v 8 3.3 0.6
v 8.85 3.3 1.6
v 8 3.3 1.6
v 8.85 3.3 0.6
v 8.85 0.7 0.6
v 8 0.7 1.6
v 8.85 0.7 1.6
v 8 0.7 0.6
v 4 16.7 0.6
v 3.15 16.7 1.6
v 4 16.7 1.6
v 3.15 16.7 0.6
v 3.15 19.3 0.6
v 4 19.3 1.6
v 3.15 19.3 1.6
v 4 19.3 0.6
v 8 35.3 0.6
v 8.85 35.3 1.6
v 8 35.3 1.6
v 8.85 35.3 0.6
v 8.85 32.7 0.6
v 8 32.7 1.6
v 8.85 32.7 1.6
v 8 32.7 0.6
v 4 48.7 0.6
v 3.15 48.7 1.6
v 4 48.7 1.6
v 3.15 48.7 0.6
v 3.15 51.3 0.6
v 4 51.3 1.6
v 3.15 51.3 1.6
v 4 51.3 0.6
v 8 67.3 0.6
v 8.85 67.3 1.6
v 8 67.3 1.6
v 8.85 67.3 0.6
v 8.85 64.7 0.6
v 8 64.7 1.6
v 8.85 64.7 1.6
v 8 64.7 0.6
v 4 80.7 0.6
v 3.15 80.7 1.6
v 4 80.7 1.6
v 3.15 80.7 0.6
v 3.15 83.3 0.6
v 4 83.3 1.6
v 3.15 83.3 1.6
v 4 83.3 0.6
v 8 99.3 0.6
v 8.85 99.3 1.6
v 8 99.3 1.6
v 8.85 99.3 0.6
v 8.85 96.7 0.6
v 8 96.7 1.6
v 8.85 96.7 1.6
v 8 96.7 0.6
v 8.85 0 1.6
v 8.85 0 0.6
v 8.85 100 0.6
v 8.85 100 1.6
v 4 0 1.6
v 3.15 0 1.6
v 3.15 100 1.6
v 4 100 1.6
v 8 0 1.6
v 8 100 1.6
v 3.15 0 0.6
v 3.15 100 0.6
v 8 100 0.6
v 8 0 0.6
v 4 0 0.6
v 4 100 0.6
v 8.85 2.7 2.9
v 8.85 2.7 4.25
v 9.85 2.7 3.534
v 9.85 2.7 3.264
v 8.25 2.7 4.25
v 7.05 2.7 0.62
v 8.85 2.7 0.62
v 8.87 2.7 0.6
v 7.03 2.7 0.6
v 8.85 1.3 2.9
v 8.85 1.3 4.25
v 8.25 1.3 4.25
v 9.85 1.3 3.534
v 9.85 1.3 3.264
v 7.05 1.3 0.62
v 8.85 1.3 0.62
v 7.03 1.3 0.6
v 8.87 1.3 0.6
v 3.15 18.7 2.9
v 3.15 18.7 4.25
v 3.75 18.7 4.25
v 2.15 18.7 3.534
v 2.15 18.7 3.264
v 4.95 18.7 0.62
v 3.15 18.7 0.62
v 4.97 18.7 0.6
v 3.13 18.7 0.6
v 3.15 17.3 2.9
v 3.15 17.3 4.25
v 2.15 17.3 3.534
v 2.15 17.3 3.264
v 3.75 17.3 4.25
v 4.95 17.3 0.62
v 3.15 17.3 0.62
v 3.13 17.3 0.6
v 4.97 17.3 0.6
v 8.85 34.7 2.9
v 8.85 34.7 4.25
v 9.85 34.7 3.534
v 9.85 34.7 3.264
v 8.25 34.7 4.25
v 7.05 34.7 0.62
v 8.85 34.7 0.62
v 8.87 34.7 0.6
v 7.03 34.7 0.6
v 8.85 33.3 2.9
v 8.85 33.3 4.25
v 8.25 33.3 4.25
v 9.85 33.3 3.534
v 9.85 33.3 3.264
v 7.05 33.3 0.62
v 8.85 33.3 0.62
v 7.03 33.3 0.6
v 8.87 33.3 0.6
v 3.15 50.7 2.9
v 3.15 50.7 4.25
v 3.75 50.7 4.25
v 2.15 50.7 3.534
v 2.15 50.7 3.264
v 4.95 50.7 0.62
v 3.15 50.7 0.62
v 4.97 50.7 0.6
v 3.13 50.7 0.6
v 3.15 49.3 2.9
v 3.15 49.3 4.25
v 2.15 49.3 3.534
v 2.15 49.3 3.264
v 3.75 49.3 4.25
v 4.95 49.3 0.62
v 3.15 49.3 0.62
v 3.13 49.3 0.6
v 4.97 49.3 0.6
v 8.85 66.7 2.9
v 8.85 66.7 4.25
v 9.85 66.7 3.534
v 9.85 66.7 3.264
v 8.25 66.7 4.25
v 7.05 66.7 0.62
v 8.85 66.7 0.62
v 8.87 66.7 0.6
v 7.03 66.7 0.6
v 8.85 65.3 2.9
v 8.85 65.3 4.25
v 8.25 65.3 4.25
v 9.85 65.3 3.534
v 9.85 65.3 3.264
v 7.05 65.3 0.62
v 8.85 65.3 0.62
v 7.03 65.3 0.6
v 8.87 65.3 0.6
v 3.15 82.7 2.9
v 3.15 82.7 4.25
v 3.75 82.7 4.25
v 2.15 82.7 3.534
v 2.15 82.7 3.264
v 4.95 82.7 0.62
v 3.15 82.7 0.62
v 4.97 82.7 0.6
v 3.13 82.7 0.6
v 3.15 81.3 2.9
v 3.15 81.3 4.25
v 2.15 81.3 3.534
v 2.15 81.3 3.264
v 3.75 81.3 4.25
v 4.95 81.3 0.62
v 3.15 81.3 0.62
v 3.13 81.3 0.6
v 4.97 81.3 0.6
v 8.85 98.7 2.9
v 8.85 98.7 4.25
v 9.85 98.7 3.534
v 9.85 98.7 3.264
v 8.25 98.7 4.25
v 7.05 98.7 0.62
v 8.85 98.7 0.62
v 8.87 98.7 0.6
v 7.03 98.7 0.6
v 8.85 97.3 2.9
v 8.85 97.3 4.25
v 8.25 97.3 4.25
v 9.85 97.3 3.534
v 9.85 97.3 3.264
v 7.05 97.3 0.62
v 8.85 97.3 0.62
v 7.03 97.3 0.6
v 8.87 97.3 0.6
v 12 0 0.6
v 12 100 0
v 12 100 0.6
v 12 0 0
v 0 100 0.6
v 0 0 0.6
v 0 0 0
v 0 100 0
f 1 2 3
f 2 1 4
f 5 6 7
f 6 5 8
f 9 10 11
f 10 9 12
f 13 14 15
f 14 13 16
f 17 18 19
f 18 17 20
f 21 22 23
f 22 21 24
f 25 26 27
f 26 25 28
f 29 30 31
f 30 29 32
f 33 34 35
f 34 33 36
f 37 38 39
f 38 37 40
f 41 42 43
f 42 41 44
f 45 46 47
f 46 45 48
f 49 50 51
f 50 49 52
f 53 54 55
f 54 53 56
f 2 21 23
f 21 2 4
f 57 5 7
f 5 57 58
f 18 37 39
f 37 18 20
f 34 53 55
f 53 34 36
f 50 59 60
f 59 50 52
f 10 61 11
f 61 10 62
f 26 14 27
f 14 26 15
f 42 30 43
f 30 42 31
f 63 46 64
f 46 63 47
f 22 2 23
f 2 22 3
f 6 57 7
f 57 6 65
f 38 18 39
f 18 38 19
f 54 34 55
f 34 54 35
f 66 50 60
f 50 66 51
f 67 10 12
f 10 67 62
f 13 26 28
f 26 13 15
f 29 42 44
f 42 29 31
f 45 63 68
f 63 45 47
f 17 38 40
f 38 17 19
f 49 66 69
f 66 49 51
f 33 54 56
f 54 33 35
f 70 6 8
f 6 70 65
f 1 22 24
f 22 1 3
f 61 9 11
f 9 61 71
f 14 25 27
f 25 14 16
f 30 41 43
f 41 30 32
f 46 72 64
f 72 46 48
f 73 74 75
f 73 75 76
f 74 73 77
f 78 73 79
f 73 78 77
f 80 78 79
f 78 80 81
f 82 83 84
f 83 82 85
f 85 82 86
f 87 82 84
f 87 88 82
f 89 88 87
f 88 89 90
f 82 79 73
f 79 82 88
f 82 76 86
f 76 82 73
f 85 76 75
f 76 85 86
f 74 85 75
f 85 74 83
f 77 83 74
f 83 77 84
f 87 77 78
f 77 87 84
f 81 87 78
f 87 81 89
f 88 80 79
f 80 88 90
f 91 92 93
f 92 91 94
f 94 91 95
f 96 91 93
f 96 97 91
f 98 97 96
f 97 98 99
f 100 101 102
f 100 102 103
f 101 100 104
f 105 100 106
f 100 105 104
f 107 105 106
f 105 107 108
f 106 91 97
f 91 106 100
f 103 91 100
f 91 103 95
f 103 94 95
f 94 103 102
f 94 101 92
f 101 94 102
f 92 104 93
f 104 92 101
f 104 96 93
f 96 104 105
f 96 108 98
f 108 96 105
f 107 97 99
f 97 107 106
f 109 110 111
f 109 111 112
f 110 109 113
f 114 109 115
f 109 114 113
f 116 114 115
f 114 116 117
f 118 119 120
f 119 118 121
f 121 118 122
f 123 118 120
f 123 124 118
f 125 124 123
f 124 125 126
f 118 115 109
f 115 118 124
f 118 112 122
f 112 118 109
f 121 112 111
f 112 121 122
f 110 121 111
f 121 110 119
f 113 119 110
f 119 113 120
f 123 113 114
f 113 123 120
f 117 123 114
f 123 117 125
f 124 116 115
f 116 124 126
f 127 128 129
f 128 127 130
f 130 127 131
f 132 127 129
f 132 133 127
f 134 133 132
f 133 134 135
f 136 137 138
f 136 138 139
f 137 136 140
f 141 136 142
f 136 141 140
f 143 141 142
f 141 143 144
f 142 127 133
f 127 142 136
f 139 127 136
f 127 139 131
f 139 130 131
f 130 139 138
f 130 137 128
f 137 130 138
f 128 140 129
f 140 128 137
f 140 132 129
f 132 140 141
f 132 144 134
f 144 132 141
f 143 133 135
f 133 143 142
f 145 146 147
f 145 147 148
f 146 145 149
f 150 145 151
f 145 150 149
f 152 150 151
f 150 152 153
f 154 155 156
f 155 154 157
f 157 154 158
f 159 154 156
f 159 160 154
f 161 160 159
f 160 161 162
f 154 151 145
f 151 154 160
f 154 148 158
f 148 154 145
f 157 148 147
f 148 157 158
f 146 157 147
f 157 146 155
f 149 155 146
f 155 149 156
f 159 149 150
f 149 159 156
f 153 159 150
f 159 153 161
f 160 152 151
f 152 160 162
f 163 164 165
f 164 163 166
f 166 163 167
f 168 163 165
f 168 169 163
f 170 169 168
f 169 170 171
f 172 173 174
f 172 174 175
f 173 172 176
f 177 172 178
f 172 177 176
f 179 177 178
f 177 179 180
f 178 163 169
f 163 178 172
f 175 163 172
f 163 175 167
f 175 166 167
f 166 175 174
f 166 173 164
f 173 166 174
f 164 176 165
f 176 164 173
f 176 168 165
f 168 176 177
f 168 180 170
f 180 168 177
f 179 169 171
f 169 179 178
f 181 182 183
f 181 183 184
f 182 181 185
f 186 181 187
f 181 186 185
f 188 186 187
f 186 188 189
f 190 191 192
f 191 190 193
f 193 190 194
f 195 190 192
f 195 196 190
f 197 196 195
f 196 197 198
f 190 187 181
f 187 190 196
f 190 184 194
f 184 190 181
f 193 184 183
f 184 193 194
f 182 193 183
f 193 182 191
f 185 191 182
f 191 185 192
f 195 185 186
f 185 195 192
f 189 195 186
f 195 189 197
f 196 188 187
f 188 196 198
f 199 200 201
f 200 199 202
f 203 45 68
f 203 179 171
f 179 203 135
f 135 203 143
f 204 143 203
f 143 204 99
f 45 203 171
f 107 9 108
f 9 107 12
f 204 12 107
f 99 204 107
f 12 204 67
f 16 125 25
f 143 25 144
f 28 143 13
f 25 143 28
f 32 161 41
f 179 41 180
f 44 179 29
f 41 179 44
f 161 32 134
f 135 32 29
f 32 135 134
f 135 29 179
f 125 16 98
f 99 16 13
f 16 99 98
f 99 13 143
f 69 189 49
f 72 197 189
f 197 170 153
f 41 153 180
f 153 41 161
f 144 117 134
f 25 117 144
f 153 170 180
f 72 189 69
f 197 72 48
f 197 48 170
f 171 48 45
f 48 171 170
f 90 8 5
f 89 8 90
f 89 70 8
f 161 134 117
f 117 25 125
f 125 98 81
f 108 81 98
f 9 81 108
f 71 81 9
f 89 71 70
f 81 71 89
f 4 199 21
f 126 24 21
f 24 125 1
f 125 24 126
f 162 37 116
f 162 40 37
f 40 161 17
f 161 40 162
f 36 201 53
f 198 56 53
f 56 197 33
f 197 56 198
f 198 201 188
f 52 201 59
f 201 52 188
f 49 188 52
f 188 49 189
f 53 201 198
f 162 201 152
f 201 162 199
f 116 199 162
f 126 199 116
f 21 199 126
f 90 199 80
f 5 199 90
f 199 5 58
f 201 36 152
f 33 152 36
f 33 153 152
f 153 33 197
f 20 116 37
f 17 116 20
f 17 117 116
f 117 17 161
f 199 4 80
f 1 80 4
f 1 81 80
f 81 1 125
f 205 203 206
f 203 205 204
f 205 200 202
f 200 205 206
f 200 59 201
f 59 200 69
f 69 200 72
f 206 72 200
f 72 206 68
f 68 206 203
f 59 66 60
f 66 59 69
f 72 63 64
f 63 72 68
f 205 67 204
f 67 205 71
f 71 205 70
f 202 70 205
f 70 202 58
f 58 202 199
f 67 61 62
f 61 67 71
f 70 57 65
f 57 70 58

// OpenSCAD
// user configuration

// should be equal to spacing of LEDs in your strip
snap_spacing=16.0;

// total length of the part
length=100;

// increase this if you want to go thicker but diffuser_block_depth is already at maximum value
top_thickness=0.6;

// bigger value -> less light gets through. should not exceed 4, otherwise won't fit in 2020 V slot with LED
diffuser_block_depth=1.0;

// set to 0 to solidify the middle between walls
canyon_width=4;

tolerance=0.3;

// should be at least 8
top_width=12.0;

// probably not interesting
hide_from_ui=sin(0);
tol=tolerance; // abbreviation
depth=4 - tol + hide_from_ui;
width=6 - tol + hide_from_ui;
snap_width=2.0 + hide_from_ui;
snap_slot_depth=2.75 + hide_from_ui;

/*
     |-| overhang_depth
y   __ ...y=h+overhang_h
|  |  \
|  |  | <- land_length
|  |  / <- return_angle
|  | |......................y=h
|  | |  <- thickness
|  | |
| _/ \_ <- bevel
+----|-----------> x
     *x=0

w: length in Z dimension
h: how thick is whatever edge the hook attaches to
w_tip is fraction, specifies Z dimension of tip relative to base
*/
module cantilever(w,h,thickness=1.2,overhang_depth=0.6,return_angle=30,w_tip=1,overhang_h=3.0,base=2.0,bevel=2/3) {
	t=1/2*thickness;
	t0=thickness*base;
	b=bevel*thickness;
	bot_slope_h=overhang_depth * tan(return_angle);
	//land_length=overhang_h/3;
	land_length=overhang_h/5;
	slant=atan((w-w*w_tip)/2/(h+overhang_h));
	difference() {
		linear_extrude(height=w)
		polygon([
		[-t0-b,0], [-t0,b], [-t,h+overhang_h], [0,h+overhang_h],
		[overhang_depth,h+bot_slope_h+land_length],
		[overhang_depth,h+bot_slope_h], [0,h], [0,b], [b,0]]);
		translate([-1e5,-1e-5,-1e-5])
		rotate(slant,[1,0,0])
		mirror([0,0,1])
		cube([2e5,1e5,1e5]);
		translate([-1e5,-1e-5,w+1e-5])
		rotate(-slant,[1,0,0])
		cube([2e5,1e5,1e5]);
	}
}

module slots() {
	for(y=[(length%snap_spacing-snap_width)/2:2*snap_spacing:length]) {
		translate([top_width/2+width/2, y, 0]) children(0);
		translate([top_width/2-width/2, y + snap_spacing, 0]) mirror([1,0,0]) children(0);
	}
}

intersection(convexity=10) {
	union() {
		if (diffuser_block_depth > 0) {
			difference() {
				// the diffuser block
				translate([top_width/2-width/2,-1,-1]) cube([width, length+2, top_thickness+1+diffuser_block_depth]);

				// slots for cantilevers
				slots()
				translate([-snap_slot_depth,-tol,0])
				cube([snap_slot_depth+5,snap_width+2*tol,1e4]);

				if (canyon_width > 0) {
					// canyon in the middle
					translate([top_width/2,length/2,diffuser_block_depth/2]) cube([canyon_width,1e5,1e5],center=true);
				}
			}
		}

		// top plate
		translate([0,-2,-3]) cube([top_width, length+4, top_thickness+3]);

		slots()
		translate([0,snap_width-tol,top_thickness-0.1])
		rotate(90,[1,0,0])
		cantilever(snap_width-2*tol, 2+tol+0.1, thickness=1.2, overhang_depth=1.0, return_angle=20, overhang_h=1.35, base=1.5, bevel=0.1);
	}
	cube([top_width, length, depth + top_thickness]);
}
